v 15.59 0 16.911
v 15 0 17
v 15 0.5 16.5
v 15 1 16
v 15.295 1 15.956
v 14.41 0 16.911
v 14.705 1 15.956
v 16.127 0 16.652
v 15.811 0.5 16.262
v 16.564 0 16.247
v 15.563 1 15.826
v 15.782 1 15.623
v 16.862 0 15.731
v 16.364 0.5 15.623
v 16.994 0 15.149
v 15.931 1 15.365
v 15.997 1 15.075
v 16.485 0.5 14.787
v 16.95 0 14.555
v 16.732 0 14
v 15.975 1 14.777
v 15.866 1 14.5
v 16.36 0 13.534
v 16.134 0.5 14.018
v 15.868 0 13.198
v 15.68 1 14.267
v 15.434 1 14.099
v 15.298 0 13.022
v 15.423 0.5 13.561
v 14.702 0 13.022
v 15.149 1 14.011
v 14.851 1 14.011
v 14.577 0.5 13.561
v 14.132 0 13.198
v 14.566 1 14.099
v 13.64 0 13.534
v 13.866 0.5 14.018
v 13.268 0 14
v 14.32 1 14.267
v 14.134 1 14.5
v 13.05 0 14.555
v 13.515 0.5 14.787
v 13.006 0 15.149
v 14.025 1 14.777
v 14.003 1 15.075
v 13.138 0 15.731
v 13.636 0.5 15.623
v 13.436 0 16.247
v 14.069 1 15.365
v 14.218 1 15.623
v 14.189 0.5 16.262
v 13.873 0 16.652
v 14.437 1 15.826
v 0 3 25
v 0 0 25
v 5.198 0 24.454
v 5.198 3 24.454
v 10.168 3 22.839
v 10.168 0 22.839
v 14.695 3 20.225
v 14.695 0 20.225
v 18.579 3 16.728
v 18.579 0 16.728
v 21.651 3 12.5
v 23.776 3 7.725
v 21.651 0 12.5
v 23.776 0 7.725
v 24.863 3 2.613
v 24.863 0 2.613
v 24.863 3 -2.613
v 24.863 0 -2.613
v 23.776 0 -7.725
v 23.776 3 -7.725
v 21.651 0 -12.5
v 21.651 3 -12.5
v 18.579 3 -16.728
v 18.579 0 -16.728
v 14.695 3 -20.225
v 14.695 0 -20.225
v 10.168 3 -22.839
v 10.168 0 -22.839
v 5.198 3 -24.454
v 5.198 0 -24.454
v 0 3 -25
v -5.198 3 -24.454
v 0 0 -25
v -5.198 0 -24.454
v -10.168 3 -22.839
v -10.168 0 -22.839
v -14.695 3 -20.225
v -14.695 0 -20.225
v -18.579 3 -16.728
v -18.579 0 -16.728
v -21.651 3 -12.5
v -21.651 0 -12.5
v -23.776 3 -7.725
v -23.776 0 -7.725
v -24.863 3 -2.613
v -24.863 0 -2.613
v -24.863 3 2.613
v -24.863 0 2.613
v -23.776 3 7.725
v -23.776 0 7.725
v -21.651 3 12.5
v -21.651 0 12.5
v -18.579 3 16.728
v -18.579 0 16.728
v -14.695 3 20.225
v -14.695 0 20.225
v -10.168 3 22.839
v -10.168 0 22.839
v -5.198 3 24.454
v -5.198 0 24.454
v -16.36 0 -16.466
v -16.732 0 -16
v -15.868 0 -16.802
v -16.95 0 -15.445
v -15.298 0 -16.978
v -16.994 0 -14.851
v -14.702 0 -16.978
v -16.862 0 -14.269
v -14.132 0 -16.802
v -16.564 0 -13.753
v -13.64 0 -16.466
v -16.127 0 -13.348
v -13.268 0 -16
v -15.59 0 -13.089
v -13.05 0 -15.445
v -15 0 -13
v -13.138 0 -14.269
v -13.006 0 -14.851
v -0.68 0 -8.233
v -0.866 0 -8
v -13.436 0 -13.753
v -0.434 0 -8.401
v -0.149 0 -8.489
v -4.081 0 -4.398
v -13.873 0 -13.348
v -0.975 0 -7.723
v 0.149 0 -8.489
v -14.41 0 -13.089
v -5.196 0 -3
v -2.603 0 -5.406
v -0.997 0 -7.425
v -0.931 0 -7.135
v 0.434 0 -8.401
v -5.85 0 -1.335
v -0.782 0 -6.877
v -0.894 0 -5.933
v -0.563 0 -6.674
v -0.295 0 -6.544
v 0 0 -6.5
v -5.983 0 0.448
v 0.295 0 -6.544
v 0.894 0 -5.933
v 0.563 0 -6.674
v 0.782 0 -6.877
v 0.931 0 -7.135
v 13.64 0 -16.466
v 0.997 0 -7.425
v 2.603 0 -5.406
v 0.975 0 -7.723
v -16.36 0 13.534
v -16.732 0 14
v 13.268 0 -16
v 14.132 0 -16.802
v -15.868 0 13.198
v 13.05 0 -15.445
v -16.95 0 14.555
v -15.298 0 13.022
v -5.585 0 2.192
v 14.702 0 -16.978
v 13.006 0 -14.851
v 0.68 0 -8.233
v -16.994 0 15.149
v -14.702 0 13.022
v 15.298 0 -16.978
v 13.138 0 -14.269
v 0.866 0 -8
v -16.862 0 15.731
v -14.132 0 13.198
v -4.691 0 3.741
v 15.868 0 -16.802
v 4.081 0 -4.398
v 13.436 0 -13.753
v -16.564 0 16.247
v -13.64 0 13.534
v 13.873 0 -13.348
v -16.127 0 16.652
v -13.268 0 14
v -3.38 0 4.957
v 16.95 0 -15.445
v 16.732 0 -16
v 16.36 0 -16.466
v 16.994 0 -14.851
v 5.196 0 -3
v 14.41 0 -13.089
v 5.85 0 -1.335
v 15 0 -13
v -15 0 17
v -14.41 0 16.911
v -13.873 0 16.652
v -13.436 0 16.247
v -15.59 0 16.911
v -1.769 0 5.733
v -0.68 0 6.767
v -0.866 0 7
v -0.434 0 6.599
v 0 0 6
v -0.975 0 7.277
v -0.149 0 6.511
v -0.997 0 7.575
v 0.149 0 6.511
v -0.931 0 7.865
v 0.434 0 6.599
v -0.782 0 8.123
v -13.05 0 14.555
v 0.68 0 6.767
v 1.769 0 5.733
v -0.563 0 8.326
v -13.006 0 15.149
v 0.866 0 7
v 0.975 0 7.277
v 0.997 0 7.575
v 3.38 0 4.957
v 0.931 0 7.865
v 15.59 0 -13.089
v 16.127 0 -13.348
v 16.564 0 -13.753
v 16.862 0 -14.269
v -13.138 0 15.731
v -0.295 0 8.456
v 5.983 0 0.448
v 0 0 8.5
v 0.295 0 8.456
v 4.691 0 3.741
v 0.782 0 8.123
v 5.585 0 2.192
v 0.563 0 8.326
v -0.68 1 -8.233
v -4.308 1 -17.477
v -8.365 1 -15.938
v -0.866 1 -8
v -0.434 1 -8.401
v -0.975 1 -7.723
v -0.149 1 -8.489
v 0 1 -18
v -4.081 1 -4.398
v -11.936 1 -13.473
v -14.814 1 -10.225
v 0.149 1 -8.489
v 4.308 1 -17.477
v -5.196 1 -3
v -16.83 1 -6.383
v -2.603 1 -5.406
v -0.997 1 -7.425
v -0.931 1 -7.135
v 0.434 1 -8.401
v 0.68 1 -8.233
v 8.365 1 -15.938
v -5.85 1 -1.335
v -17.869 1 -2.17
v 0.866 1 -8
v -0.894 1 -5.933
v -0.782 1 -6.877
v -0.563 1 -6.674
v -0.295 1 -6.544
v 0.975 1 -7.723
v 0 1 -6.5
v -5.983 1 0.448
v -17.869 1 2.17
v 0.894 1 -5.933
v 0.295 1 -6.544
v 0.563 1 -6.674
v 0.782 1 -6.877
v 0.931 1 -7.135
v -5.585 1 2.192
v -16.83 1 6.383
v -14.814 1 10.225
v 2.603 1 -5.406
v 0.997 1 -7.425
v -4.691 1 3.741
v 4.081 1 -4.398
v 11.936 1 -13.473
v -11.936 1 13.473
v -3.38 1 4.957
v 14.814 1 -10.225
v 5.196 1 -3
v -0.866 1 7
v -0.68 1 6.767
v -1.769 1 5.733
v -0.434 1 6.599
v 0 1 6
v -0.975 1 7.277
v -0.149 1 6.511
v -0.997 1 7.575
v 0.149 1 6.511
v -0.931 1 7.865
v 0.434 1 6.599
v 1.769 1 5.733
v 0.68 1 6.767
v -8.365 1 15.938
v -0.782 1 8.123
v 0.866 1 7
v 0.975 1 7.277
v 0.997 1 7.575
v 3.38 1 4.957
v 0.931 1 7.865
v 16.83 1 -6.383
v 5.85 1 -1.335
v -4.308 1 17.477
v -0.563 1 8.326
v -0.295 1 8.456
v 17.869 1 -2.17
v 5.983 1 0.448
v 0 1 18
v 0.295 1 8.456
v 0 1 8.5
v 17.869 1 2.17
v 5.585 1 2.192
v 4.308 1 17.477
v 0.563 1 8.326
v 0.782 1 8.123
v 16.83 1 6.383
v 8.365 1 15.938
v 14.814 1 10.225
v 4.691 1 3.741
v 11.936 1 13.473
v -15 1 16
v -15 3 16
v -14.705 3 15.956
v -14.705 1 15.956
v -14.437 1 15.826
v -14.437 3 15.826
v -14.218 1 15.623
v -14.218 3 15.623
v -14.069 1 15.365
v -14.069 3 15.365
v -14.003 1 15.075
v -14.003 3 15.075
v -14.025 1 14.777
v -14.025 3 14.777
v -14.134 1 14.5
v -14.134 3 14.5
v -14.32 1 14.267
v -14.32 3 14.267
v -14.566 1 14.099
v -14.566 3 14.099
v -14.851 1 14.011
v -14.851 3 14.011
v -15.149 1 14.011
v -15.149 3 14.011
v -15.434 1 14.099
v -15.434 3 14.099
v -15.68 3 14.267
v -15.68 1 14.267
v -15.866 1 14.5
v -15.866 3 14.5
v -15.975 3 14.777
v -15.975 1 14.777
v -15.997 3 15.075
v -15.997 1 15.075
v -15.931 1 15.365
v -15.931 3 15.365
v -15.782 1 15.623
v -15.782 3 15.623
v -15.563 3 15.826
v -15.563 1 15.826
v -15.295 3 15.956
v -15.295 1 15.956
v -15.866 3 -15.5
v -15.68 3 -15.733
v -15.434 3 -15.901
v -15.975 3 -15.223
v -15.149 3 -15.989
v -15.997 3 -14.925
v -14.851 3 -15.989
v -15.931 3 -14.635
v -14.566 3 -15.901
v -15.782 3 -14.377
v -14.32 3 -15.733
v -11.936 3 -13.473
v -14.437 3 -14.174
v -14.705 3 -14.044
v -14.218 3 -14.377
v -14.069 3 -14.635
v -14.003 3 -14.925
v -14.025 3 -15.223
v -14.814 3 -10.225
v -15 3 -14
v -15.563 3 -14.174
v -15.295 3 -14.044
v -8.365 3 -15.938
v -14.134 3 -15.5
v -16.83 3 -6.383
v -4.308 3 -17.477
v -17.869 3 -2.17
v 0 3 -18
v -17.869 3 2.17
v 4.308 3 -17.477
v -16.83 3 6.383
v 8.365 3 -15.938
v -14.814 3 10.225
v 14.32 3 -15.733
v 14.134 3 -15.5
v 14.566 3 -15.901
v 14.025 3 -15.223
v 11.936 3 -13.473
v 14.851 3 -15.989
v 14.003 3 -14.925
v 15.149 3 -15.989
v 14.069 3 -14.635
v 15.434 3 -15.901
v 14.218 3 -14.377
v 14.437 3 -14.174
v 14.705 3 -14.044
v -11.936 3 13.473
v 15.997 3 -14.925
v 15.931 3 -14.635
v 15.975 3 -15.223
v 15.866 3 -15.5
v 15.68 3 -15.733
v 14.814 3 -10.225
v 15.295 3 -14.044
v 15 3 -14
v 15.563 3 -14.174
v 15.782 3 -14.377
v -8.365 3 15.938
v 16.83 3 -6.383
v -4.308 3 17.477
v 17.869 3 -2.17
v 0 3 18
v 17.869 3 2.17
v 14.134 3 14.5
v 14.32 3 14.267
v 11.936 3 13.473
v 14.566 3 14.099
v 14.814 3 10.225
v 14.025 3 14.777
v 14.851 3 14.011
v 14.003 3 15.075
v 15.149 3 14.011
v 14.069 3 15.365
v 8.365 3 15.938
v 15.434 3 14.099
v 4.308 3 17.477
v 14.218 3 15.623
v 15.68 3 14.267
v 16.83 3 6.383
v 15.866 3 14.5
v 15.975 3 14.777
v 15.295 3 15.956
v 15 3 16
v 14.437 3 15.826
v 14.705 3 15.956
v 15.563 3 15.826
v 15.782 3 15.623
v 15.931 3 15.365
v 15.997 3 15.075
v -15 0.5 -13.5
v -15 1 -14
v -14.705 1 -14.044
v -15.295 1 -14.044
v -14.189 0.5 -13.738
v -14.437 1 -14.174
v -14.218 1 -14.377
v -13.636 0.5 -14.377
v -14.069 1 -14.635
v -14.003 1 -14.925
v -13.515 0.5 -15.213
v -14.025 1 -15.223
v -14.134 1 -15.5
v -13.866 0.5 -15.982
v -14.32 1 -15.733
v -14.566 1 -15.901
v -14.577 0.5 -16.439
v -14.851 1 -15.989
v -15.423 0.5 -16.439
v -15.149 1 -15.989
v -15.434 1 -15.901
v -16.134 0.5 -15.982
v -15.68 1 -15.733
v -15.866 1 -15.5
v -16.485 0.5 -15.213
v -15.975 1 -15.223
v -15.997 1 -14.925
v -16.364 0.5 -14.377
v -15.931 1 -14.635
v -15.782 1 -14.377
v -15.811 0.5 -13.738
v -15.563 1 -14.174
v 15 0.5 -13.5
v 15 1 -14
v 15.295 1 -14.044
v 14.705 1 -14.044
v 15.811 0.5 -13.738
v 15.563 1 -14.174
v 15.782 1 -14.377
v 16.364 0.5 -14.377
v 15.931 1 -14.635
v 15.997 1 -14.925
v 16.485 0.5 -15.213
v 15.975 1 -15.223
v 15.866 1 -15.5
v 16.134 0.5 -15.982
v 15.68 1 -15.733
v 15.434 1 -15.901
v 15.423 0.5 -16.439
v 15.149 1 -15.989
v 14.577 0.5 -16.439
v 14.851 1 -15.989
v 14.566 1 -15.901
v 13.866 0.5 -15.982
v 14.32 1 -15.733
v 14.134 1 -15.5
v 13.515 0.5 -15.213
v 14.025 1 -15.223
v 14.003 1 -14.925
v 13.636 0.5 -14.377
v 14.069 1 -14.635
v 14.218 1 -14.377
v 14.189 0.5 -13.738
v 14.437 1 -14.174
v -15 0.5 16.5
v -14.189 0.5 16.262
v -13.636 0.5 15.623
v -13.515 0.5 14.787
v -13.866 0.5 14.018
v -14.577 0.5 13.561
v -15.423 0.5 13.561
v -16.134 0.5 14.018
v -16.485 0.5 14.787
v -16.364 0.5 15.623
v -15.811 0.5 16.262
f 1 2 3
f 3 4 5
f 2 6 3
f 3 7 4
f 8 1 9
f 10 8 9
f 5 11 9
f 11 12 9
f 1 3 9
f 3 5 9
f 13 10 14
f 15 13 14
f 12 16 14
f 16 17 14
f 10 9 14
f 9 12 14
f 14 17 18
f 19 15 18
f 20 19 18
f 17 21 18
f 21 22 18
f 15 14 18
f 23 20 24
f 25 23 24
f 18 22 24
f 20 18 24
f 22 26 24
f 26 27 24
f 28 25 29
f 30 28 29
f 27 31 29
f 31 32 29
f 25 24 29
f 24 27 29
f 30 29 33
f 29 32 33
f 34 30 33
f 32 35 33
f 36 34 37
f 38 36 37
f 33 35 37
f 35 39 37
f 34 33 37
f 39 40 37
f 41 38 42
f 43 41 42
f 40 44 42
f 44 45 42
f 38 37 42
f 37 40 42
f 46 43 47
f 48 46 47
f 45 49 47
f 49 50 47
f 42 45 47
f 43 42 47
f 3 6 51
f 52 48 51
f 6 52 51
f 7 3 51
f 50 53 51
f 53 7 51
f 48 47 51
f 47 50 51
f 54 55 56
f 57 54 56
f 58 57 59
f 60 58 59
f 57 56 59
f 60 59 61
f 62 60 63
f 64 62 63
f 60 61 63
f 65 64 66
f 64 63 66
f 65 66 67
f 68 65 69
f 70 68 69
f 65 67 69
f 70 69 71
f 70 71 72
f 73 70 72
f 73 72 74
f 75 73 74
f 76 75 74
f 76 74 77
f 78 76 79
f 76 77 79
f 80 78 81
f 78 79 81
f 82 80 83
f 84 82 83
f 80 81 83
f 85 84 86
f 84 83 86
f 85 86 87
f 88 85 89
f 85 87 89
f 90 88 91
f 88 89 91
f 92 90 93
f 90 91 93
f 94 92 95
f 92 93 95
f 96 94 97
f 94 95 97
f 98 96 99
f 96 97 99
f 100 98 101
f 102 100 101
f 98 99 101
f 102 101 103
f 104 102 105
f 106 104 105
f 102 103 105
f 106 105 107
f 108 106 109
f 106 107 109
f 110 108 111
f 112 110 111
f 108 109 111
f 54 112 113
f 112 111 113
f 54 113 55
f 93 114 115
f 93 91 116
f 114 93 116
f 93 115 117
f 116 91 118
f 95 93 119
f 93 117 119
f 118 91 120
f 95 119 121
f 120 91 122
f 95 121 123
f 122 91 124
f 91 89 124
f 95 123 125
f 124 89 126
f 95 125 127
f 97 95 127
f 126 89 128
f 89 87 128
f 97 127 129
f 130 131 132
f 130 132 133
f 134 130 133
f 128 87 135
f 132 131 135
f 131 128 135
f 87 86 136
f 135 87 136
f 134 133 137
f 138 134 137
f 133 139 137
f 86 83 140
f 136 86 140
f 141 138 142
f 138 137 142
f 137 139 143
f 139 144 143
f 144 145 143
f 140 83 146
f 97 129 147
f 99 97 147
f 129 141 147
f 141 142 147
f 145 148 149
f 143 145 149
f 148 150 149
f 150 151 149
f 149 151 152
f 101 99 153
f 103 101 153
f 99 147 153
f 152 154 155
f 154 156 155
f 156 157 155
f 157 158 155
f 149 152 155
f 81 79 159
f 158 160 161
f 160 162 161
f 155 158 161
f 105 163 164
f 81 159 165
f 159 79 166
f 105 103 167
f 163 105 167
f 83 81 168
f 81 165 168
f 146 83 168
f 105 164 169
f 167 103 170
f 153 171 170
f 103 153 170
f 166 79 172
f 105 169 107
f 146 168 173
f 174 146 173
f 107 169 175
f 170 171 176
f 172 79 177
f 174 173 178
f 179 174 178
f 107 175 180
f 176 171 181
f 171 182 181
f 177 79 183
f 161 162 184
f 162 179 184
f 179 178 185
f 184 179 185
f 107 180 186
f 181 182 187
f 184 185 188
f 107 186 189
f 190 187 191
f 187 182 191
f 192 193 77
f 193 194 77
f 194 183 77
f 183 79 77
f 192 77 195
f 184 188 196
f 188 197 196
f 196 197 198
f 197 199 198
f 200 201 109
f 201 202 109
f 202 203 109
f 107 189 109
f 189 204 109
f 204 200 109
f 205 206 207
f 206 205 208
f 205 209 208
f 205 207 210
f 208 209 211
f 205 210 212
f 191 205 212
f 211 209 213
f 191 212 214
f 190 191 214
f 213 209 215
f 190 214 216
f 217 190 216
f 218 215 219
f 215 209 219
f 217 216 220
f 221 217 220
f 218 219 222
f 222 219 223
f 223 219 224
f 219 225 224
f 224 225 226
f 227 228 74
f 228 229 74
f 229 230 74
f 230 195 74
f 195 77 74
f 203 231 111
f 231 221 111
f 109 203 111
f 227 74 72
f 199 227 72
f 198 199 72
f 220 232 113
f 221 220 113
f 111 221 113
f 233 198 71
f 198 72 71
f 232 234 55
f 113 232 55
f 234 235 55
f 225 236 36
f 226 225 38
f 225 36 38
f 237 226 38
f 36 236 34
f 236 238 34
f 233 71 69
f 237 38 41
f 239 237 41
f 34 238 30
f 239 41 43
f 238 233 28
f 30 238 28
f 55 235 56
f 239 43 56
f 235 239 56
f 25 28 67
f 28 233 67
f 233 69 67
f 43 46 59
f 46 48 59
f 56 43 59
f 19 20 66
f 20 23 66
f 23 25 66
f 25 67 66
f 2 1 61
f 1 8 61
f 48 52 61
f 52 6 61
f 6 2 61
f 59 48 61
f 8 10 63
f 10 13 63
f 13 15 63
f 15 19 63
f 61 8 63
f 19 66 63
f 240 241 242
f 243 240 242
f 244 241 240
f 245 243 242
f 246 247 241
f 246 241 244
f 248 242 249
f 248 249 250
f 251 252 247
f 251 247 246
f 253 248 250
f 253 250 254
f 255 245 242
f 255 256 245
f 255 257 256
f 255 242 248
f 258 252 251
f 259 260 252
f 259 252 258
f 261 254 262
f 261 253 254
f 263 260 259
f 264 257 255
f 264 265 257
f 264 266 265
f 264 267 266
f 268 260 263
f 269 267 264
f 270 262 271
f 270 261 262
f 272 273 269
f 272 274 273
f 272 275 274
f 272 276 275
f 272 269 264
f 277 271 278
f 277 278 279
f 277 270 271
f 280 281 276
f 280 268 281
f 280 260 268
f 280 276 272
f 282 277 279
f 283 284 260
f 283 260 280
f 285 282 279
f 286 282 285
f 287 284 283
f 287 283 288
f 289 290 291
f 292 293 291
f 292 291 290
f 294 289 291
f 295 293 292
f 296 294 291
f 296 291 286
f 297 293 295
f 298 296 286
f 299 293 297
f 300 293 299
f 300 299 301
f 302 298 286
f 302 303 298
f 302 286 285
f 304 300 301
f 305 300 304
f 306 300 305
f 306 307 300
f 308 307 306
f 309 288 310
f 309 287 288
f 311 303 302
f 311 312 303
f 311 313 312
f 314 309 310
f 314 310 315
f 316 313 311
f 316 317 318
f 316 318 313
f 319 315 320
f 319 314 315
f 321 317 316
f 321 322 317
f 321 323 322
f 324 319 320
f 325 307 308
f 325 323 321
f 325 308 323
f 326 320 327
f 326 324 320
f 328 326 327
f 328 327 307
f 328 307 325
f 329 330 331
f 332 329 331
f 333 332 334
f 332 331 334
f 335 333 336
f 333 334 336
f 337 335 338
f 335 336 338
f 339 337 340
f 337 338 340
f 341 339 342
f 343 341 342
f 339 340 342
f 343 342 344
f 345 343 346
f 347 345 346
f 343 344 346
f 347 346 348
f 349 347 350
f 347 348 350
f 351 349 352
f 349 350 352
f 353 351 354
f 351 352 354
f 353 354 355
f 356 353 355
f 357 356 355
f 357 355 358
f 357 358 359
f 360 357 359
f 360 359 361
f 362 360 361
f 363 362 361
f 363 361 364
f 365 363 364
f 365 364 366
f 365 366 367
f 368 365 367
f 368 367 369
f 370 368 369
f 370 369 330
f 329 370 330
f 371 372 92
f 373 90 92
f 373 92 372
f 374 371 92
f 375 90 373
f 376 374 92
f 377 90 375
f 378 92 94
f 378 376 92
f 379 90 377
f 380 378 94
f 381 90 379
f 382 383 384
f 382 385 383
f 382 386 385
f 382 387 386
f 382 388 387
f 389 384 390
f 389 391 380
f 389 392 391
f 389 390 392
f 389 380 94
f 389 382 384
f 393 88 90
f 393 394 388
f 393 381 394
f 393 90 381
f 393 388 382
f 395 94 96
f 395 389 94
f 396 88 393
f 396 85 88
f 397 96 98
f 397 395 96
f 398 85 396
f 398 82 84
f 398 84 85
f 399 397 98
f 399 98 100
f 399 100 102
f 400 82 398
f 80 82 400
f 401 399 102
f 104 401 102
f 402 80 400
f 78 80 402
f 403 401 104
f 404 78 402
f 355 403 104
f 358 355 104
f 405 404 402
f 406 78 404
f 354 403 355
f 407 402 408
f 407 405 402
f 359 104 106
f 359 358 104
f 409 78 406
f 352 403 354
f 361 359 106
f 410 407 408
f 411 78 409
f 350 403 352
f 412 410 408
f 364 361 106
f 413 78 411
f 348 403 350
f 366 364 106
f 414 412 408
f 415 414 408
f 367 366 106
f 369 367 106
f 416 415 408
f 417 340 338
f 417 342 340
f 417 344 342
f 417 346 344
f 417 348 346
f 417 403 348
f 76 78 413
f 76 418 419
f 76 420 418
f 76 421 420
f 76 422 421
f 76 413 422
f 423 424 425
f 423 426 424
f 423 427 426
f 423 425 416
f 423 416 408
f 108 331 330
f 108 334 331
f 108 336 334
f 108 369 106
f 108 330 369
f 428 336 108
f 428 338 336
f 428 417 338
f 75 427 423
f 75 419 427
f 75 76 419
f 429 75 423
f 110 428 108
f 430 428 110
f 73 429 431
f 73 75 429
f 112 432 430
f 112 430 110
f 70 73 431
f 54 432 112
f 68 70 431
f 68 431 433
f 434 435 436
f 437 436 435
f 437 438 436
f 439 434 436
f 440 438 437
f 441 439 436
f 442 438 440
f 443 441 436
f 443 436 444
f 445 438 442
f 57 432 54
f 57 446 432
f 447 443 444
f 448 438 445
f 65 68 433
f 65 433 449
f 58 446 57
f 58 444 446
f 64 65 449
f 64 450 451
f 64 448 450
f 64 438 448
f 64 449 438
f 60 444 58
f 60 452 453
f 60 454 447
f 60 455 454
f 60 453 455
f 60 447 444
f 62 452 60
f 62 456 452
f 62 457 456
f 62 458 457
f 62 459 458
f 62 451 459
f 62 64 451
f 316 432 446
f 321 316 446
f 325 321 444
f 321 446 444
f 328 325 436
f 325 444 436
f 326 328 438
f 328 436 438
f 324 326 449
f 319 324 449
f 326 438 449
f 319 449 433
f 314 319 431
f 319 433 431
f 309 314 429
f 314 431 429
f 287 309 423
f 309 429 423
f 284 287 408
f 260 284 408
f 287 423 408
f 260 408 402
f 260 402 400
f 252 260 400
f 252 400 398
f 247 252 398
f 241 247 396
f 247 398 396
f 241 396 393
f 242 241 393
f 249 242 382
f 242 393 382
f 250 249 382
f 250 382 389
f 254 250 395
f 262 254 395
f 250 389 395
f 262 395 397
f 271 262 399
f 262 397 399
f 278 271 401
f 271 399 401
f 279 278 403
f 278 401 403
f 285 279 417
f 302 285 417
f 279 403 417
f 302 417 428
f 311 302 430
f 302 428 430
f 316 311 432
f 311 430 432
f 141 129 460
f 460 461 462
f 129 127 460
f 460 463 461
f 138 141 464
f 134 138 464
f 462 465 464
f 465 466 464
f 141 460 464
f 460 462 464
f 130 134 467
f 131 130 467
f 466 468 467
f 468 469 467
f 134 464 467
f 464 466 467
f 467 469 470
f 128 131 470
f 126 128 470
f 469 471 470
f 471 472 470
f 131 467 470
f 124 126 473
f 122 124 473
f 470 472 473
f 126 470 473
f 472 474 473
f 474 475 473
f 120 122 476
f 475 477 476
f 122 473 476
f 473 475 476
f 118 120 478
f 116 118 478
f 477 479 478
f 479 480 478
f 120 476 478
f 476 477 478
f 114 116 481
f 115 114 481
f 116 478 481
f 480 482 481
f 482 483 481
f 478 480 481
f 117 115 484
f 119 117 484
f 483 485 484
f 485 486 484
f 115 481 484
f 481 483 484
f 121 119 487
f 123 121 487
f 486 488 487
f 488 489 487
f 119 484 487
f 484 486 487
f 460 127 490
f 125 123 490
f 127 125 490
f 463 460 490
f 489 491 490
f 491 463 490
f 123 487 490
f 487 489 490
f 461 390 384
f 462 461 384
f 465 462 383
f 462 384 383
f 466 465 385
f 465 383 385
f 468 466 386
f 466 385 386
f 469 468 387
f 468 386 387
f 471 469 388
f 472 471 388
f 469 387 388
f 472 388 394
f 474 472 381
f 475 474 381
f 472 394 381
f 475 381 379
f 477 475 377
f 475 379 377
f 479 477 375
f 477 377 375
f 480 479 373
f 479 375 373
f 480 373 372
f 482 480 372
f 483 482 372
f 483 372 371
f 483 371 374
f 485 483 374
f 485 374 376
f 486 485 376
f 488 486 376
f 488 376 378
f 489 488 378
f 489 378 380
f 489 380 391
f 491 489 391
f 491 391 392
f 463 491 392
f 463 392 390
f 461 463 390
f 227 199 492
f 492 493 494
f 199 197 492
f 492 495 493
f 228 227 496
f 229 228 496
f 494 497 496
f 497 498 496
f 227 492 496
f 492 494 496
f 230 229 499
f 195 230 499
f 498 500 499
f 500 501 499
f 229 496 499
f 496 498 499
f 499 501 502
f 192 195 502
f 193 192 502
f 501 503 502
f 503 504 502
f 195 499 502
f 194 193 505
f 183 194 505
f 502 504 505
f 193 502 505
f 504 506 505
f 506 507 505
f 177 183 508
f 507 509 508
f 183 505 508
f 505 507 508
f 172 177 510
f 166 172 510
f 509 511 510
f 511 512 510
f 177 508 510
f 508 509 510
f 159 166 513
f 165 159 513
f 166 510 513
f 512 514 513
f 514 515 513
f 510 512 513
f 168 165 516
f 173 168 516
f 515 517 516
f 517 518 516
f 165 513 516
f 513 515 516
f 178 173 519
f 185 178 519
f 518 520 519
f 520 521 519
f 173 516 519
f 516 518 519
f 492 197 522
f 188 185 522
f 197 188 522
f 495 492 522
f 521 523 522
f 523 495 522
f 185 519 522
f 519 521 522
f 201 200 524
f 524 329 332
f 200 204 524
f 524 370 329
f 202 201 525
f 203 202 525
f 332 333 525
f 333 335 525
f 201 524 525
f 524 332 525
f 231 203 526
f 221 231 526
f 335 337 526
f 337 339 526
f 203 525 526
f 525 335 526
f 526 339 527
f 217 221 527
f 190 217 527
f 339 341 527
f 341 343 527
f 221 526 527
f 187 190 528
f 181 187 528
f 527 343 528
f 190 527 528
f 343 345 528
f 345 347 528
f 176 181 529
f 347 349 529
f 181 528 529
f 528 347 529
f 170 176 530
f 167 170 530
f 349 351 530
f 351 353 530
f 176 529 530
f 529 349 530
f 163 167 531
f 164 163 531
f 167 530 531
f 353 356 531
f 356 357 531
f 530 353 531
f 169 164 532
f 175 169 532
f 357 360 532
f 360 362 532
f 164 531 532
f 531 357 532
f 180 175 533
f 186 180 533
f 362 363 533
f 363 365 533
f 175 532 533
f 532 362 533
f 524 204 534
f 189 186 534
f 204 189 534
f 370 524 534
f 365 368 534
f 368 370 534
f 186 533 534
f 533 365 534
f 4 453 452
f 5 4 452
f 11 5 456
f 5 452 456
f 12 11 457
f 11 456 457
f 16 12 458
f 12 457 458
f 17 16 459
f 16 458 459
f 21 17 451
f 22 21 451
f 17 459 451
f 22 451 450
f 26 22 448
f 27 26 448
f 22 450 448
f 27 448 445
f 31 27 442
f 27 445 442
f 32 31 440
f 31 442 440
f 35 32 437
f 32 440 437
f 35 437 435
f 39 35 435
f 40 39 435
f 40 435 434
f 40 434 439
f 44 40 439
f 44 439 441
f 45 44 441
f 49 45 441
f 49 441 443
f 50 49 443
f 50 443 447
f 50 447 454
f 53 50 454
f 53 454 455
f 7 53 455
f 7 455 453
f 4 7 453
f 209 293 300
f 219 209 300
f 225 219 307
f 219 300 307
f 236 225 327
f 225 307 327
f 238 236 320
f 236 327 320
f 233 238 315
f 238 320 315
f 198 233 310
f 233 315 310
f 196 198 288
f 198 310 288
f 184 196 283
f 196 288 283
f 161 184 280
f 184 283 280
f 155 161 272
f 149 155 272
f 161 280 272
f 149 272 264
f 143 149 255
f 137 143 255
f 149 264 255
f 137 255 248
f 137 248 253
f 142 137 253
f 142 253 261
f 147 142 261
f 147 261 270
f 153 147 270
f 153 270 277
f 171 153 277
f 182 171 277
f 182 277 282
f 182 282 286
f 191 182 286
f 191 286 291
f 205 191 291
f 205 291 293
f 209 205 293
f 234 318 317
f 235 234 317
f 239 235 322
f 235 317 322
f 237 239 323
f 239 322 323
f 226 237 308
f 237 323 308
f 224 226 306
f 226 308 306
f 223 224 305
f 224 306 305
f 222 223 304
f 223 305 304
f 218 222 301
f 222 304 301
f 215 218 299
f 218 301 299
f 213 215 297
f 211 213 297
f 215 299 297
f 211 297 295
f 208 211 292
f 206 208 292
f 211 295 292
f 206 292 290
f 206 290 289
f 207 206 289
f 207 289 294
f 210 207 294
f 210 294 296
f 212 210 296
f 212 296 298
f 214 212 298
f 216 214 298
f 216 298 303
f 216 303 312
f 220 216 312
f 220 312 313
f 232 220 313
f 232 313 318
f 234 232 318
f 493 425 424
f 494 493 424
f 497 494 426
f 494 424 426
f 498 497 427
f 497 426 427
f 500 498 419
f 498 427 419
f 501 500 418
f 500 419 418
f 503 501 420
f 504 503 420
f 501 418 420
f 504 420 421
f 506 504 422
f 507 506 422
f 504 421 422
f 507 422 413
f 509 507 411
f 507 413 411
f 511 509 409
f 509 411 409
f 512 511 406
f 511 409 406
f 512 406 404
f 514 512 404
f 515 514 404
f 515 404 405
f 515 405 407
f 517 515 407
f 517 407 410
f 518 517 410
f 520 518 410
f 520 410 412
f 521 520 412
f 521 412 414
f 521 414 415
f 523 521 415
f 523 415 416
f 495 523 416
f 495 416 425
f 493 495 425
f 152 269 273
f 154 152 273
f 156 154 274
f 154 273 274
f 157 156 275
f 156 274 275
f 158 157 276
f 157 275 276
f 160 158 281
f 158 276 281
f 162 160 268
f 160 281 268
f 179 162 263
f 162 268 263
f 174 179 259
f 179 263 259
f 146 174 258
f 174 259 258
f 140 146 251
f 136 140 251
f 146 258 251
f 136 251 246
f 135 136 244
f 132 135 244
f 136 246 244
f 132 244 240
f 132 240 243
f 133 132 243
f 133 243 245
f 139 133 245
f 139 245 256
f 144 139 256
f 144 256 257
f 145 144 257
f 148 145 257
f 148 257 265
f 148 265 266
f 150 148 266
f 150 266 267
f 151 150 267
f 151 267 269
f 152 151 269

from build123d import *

# Parameters (mm, degrees)
SKETCH1_R           = 25
BOSS_EXTRUDE1_DEPTH = 3
SKETCH3_R           = 6
SKETCH3_R_2         = 1
CUT_EXTRUDE1_DEPTH  = 36.482389998
SKETCH4_R           = 1
CUT_EXTRUDE2_DEPTH  = 36.482389998
CHAMFER1_SIZE       = 1
SKETCH5_R           = 18
CUT_EXTRUDE3_DEPTH  = 2


with BuildPart() as part:
    # Sketch1 → Boss-Extrude1 (new body)
    with BuildSketch(Plane(origin=(0, 0, 0), x_dir=(1, 0, 0), z_dir=(0, 1, 0))):
        with Locations(Location((0, 0, 0), (0, 0, 270))):
            Circle(SKETCH1_R)
    extrude(amount=BOSS_EXTRUDE1_DEPTH)

    # Sketch3 → Cut-Extrude1 (cut, through all)
    with BuildSketch(Plane(origin=(0, 3, 0), x_dir=(1, 0, 0), z_dir=(0, 1, 0))):
        with Locations(Location((0, 0, 0), (0, 0, 270))):
            Circle(SKETCH3_R)
        with Locations(Location((0, 7.5, 0), (0, 0, 270))):
            Circle(SKETCH3_R_2)
        with Locations(Location((0, -7.5, 0), (0, 0, 270))):
            Circle(SKETCH3_R_2)
    extrude(amount=-CUT_EXTRUDE1_DEPTH, mode=Mode.SUBTRACT)

    # Sketch4 → Cut-Extrude2 (cut, through all)
    with BuildSketch(Plane(origin=(0, 3, 0), x_dir=(1, 0, 0), z_dir=(0, 1, 0))):
        with Locations(Location((-15, 15, 0), (0, 0, 270))):
            Circle(SKETCH4_R)
        with Locations(Location((15, 15, 0), (0, 0, 270))):
            Circle(SKETCH4_R)
        with Locations(Location((15, -15, 0), (0, 0, 270))):
            Circle(SKETCH4_R)
        with Locations(Location((-15, -15, 0), (0, 0, 270))):
            Circle(SKETCH4_R)
    extrude(amount=-CUT_EXTRUDE2_DEPTH, mode=Mode.SUBTRACT)

    # Chamfer1
    chamfer1_edges = [part.edges().sort_by_distance(p)[0] for p in [
        (-15, 0, 14),
        (15, 0, 14),
        (15, 0, -16),
        (-15, 0, -16),
    ]]
    chamfer(chamfer1_edges, length=CHAMFER1_SIZE)

    # Sketch5 → Cut-Extrude3 (cut)
    with BuildSketch(Plane(origin=(0, 3, 0), x_dir=(1, 0, 0), z_dir=(0, 1, 0))):
        with Locations(Location((0, 0, 0), (0, 0, 270))):
            Circle(SKETCH5_R)
    extrude(amount=-CUT_EXTRUDE3_DEPTH, mode=Mode.SUBTRACT)


solid = part.part
